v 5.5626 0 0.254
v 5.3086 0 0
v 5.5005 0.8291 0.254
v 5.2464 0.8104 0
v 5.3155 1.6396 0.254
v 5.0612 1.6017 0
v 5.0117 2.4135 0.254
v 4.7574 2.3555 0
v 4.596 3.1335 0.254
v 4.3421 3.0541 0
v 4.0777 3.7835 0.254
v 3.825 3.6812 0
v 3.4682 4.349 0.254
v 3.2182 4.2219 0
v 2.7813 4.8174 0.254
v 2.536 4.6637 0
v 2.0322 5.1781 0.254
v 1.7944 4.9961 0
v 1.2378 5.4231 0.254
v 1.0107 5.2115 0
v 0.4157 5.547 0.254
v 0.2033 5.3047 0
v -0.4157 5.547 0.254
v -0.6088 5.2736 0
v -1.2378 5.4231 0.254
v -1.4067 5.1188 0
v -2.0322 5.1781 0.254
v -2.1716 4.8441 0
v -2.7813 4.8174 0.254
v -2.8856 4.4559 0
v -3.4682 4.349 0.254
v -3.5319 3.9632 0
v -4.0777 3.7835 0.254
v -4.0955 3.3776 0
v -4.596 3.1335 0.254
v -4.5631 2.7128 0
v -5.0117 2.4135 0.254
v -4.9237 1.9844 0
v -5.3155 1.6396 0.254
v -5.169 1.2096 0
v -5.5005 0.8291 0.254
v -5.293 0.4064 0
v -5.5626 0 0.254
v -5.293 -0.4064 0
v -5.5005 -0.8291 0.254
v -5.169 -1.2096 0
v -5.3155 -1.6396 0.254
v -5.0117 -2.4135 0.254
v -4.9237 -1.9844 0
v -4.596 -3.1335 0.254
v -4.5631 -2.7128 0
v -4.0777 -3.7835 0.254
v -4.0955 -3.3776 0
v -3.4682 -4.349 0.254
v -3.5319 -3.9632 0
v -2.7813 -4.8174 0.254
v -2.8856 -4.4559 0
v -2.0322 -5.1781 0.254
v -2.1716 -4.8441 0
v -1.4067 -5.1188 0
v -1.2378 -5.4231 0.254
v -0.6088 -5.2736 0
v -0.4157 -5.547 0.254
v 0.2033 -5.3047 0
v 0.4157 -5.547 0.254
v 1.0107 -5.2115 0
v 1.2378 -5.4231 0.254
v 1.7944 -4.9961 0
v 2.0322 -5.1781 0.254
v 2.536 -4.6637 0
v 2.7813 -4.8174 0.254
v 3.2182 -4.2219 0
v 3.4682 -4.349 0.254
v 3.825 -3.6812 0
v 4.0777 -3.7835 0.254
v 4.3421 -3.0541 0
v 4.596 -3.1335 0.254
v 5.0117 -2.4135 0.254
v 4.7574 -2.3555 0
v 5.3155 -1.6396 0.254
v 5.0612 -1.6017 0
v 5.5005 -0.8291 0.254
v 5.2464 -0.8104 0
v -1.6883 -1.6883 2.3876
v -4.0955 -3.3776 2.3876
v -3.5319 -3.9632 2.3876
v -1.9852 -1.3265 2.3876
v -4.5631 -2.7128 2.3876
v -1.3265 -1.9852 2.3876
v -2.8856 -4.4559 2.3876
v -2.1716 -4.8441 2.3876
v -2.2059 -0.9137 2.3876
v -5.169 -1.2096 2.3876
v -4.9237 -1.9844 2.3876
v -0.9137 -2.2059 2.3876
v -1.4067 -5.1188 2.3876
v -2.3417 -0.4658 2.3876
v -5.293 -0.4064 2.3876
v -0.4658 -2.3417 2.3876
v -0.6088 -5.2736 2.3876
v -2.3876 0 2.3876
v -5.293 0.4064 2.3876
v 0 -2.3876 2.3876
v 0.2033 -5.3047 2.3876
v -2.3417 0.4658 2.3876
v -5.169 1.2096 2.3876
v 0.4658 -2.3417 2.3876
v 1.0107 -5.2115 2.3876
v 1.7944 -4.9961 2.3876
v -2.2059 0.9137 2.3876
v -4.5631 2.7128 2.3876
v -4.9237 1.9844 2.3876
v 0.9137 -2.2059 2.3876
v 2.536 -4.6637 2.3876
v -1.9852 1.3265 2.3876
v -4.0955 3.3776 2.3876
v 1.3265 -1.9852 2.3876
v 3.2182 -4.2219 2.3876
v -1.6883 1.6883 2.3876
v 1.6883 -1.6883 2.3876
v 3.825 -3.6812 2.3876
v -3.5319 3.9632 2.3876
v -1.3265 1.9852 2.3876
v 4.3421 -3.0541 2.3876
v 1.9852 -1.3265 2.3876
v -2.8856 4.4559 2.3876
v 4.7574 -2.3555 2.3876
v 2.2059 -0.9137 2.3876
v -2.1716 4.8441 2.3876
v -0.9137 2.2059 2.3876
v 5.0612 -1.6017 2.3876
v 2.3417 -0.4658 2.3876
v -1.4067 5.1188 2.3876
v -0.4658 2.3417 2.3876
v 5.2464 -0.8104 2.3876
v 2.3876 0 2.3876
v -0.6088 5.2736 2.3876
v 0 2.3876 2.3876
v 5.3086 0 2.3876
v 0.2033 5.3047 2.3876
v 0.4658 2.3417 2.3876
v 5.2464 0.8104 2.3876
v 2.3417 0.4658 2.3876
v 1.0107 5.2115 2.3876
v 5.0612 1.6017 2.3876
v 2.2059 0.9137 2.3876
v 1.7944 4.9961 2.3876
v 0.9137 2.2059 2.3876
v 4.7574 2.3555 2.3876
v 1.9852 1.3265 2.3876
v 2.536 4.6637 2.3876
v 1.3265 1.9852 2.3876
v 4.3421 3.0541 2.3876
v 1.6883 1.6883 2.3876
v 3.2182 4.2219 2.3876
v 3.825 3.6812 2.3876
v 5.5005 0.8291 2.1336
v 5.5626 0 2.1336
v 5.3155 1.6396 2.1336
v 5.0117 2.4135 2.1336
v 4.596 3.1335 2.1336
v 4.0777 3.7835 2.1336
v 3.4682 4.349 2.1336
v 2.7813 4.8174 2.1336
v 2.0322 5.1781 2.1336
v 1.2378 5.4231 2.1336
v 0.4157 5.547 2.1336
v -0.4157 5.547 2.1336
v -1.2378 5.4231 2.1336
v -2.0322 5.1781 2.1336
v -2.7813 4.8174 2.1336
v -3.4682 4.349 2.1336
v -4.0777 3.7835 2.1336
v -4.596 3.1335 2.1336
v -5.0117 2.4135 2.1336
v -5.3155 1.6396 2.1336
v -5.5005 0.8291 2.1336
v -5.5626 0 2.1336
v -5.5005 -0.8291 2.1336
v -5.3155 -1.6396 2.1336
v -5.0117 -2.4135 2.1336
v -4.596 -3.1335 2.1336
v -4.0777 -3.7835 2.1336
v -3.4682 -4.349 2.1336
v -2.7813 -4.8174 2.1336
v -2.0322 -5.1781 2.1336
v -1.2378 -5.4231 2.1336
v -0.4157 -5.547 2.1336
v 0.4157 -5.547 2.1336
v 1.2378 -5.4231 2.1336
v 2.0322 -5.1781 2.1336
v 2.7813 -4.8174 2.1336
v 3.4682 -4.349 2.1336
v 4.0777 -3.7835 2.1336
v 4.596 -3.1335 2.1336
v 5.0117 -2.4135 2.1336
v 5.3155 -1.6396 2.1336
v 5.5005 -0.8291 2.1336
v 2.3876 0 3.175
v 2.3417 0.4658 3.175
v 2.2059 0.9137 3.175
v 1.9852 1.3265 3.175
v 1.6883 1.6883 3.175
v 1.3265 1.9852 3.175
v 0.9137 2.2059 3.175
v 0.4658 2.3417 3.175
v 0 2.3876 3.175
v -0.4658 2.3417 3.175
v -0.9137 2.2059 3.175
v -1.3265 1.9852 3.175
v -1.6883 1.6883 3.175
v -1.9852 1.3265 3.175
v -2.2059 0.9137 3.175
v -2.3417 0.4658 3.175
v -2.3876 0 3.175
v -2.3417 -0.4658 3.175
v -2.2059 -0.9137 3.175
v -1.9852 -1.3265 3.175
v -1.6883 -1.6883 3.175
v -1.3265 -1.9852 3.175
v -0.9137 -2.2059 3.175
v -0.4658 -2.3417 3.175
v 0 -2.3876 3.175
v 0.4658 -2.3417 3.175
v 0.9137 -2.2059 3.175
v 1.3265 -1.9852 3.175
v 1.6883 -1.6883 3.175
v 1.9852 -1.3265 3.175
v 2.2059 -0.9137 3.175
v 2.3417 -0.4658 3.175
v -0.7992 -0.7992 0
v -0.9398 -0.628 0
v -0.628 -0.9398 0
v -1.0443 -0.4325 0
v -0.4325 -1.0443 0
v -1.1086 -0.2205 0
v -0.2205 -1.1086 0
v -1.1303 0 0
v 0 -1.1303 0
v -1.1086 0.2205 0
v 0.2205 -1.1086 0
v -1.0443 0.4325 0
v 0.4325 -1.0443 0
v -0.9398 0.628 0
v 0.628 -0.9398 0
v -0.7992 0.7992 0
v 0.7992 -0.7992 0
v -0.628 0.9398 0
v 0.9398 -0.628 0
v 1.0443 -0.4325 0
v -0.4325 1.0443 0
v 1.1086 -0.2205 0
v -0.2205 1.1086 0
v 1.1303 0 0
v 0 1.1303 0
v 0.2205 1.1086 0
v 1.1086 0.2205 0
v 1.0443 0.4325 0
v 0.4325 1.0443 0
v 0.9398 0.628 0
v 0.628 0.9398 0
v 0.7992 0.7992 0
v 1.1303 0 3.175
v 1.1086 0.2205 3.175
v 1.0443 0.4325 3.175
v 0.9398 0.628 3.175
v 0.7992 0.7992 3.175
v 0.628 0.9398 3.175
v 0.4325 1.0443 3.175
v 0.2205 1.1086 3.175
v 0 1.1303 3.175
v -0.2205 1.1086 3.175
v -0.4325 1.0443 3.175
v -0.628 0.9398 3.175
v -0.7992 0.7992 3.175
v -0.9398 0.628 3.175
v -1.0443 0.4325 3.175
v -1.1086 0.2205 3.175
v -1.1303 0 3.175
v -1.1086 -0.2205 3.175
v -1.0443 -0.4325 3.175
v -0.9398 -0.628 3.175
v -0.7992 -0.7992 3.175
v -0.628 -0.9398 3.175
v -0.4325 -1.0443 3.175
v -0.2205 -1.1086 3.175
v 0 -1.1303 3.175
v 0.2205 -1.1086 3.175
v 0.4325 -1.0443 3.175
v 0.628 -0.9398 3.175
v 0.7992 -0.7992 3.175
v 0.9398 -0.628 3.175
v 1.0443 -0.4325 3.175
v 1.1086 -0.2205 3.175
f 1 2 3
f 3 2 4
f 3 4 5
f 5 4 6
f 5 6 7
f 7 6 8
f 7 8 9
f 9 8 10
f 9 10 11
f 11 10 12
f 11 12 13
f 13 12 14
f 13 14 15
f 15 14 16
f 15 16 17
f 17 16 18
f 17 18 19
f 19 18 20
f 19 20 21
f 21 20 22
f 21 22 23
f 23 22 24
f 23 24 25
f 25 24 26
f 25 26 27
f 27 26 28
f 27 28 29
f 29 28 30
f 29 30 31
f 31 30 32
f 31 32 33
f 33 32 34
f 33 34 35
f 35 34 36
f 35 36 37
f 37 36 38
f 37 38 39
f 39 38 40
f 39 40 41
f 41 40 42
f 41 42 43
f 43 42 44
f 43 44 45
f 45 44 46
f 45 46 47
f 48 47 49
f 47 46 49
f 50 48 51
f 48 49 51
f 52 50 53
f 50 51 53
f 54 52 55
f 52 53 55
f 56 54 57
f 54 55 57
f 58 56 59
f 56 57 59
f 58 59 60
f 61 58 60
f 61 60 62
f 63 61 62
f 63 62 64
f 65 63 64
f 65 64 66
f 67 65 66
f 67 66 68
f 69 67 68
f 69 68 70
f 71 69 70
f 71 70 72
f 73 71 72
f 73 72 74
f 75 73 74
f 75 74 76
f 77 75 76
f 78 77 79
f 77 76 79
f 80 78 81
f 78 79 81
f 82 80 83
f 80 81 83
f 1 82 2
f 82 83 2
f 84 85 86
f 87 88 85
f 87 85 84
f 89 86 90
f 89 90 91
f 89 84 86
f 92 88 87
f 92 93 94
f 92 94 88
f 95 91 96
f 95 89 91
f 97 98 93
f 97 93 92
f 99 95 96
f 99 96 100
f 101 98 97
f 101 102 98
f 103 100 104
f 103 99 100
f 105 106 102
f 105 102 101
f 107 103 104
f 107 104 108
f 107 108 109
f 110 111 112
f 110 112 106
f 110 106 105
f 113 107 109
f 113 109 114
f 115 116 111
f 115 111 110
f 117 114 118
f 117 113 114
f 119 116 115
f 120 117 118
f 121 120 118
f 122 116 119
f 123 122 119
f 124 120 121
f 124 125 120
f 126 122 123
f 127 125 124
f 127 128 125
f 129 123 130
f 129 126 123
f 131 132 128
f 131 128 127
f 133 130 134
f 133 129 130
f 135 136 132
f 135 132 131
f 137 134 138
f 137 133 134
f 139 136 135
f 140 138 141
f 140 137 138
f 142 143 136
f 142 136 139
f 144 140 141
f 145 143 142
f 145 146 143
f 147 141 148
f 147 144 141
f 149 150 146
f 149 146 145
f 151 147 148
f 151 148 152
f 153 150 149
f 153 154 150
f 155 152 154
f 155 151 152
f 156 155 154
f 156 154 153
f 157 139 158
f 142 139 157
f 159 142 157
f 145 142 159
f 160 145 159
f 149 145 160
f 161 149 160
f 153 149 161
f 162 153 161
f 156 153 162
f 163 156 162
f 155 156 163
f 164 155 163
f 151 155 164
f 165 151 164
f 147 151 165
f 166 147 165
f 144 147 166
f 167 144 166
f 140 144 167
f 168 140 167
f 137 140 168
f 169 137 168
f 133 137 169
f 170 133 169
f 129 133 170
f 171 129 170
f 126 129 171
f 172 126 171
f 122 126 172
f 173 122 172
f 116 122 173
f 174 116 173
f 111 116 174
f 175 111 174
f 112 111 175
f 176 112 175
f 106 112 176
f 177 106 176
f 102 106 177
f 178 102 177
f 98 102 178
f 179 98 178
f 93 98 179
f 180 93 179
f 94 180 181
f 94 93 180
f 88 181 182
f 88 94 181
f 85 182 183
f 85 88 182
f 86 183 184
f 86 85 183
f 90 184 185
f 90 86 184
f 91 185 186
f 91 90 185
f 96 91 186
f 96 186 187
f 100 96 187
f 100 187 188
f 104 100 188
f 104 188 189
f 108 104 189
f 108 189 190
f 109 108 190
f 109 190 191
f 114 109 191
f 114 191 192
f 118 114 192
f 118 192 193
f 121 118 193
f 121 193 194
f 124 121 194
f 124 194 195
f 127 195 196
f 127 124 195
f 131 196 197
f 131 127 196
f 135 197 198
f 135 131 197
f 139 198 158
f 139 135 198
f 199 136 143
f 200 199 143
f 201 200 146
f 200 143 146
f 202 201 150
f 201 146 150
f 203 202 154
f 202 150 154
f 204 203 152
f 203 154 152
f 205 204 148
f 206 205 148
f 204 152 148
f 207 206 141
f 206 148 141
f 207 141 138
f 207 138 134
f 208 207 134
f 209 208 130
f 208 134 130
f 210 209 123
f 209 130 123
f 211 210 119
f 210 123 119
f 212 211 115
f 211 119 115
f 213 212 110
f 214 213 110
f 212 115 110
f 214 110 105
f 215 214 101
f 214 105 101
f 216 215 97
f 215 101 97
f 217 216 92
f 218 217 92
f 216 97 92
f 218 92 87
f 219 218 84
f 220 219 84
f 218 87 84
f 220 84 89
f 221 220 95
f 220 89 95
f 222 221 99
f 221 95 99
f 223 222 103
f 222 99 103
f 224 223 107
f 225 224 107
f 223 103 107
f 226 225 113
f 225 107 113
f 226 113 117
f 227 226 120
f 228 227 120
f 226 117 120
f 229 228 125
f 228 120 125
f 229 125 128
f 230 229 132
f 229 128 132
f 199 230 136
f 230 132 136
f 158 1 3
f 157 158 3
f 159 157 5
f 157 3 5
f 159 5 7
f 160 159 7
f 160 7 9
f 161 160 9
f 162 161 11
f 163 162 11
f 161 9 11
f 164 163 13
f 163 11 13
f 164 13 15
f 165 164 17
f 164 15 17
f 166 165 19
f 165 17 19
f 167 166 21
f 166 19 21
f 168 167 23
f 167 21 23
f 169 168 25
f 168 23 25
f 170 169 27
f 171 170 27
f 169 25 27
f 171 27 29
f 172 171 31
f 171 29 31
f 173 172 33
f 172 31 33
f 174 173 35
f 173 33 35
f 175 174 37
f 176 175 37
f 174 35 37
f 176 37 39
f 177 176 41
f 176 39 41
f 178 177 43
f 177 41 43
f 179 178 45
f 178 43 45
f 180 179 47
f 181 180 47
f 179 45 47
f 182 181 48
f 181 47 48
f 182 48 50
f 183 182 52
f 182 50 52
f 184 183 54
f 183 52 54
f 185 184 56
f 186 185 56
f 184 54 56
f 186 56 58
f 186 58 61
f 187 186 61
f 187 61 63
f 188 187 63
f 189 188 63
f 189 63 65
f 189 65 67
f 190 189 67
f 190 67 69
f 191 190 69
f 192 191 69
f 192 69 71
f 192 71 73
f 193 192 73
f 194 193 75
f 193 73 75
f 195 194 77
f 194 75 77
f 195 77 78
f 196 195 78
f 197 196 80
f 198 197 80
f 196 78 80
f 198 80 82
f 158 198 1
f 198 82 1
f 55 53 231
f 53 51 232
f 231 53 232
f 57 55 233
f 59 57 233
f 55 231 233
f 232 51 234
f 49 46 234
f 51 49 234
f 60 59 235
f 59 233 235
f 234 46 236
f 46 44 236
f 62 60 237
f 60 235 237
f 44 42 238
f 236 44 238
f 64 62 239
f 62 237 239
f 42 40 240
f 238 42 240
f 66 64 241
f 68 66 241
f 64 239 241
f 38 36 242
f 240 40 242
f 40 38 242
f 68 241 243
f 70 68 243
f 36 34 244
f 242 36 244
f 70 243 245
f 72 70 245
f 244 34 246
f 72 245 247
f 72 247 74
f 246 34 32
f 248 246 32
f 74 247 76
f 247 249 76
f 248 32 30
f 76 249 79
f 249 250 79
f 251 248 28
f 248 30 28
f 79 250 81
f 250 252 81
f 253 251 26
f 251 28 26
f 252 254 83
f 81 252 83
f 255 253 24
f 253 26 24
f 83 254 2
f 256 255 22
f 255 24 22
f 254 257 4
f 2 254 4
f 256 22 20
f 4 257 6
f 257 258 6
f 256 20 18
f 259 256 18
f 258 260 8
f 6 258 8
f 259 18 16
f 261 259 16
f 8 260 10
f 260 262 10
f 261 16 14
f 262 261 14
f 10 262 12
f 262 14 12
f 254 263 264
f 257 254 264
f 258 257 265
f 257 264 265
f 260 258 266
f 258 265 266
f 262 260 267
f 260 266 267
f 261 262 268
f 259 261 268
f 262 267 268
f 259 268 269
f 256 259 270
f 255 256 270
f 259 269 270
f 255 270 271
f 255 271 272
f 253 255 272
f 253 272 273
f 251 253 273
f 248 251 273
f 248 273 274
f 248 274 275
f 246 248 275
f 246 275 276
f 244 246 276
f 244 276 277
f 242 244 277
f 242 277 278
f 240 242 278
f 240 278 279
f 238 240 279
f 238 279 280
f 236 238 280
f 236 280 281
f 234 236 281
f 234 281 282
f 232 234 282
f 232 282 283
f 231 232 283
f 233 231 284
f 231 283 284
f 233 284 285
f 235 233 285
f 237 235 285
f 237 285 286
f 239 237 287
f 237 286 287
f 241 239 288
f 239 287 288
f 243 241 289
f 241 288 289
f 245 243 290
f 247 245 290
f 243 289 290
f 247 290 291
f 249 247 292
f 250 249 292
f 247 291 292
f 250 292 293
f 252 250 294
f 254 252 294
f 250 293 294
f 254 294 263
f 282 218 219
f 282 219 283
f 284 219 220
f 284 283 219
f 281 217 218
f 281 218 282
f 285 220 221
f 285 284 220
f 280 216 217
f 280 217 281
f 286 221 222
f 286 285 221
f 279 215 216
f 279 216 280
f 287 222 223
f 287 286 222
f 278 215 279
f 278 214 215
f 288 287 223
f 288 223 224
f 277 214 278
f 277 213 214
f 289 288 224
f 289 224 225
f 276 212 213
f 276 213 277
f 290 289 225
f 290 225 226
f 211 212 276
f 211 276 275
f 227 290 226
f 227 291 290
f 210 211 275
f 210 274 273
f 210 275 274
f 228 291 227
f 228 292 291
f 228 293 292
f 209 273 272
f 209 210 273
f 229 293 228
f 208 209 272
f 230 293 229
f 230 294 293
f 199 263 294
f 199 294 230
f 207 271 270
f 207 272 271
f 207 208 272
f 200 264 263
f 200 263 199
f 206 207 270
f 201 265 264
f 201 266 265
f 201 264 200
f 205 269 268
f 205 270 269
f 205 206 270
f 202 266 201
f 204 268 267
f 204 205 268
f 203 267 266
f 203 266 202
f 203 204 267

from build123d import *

# Parameters (mm, degrees)
F0_R     = 5.5626
F1_DEPTH = 2.3876
F2_R     = 2.3876
F3_DEPTH = 0.7874
F4_R     = 1.1303
F5_DEPTH = 3.176
F6_SIZE  = 0.254


with BuildPart() as f1:
    # F0 (on Top) → F1 (new body)
    with BuildSketch(Plane.XY):
        Circle(F0_R)
    extrude(amount=F1_DEPTH)

    # F2 (on face) → F3 (join)
    with BuildSketch(Plane.XY.offset(2.3876)):
        Circle(F2_R)
    extrude(amount=F3_DEPTH)

    # F4 (on face) → F5 (cut, through all)
    with BuildSketch(Plane.XY.offset(3.175)):
        Circle(F4_R)
    extrude(amount=-F5_DEPTH, mode=Mode.SUBTRACT)

    # F6
    f6_edges = [f1.edges().sort_by_distance(p)[0] for p in [
        (-5.5626, 0, 2.3876),
        (-5.5626, 0, 0),
    ]]
    chamfer(f6_edges, length=F6_SIZE)


solid = f1.part
